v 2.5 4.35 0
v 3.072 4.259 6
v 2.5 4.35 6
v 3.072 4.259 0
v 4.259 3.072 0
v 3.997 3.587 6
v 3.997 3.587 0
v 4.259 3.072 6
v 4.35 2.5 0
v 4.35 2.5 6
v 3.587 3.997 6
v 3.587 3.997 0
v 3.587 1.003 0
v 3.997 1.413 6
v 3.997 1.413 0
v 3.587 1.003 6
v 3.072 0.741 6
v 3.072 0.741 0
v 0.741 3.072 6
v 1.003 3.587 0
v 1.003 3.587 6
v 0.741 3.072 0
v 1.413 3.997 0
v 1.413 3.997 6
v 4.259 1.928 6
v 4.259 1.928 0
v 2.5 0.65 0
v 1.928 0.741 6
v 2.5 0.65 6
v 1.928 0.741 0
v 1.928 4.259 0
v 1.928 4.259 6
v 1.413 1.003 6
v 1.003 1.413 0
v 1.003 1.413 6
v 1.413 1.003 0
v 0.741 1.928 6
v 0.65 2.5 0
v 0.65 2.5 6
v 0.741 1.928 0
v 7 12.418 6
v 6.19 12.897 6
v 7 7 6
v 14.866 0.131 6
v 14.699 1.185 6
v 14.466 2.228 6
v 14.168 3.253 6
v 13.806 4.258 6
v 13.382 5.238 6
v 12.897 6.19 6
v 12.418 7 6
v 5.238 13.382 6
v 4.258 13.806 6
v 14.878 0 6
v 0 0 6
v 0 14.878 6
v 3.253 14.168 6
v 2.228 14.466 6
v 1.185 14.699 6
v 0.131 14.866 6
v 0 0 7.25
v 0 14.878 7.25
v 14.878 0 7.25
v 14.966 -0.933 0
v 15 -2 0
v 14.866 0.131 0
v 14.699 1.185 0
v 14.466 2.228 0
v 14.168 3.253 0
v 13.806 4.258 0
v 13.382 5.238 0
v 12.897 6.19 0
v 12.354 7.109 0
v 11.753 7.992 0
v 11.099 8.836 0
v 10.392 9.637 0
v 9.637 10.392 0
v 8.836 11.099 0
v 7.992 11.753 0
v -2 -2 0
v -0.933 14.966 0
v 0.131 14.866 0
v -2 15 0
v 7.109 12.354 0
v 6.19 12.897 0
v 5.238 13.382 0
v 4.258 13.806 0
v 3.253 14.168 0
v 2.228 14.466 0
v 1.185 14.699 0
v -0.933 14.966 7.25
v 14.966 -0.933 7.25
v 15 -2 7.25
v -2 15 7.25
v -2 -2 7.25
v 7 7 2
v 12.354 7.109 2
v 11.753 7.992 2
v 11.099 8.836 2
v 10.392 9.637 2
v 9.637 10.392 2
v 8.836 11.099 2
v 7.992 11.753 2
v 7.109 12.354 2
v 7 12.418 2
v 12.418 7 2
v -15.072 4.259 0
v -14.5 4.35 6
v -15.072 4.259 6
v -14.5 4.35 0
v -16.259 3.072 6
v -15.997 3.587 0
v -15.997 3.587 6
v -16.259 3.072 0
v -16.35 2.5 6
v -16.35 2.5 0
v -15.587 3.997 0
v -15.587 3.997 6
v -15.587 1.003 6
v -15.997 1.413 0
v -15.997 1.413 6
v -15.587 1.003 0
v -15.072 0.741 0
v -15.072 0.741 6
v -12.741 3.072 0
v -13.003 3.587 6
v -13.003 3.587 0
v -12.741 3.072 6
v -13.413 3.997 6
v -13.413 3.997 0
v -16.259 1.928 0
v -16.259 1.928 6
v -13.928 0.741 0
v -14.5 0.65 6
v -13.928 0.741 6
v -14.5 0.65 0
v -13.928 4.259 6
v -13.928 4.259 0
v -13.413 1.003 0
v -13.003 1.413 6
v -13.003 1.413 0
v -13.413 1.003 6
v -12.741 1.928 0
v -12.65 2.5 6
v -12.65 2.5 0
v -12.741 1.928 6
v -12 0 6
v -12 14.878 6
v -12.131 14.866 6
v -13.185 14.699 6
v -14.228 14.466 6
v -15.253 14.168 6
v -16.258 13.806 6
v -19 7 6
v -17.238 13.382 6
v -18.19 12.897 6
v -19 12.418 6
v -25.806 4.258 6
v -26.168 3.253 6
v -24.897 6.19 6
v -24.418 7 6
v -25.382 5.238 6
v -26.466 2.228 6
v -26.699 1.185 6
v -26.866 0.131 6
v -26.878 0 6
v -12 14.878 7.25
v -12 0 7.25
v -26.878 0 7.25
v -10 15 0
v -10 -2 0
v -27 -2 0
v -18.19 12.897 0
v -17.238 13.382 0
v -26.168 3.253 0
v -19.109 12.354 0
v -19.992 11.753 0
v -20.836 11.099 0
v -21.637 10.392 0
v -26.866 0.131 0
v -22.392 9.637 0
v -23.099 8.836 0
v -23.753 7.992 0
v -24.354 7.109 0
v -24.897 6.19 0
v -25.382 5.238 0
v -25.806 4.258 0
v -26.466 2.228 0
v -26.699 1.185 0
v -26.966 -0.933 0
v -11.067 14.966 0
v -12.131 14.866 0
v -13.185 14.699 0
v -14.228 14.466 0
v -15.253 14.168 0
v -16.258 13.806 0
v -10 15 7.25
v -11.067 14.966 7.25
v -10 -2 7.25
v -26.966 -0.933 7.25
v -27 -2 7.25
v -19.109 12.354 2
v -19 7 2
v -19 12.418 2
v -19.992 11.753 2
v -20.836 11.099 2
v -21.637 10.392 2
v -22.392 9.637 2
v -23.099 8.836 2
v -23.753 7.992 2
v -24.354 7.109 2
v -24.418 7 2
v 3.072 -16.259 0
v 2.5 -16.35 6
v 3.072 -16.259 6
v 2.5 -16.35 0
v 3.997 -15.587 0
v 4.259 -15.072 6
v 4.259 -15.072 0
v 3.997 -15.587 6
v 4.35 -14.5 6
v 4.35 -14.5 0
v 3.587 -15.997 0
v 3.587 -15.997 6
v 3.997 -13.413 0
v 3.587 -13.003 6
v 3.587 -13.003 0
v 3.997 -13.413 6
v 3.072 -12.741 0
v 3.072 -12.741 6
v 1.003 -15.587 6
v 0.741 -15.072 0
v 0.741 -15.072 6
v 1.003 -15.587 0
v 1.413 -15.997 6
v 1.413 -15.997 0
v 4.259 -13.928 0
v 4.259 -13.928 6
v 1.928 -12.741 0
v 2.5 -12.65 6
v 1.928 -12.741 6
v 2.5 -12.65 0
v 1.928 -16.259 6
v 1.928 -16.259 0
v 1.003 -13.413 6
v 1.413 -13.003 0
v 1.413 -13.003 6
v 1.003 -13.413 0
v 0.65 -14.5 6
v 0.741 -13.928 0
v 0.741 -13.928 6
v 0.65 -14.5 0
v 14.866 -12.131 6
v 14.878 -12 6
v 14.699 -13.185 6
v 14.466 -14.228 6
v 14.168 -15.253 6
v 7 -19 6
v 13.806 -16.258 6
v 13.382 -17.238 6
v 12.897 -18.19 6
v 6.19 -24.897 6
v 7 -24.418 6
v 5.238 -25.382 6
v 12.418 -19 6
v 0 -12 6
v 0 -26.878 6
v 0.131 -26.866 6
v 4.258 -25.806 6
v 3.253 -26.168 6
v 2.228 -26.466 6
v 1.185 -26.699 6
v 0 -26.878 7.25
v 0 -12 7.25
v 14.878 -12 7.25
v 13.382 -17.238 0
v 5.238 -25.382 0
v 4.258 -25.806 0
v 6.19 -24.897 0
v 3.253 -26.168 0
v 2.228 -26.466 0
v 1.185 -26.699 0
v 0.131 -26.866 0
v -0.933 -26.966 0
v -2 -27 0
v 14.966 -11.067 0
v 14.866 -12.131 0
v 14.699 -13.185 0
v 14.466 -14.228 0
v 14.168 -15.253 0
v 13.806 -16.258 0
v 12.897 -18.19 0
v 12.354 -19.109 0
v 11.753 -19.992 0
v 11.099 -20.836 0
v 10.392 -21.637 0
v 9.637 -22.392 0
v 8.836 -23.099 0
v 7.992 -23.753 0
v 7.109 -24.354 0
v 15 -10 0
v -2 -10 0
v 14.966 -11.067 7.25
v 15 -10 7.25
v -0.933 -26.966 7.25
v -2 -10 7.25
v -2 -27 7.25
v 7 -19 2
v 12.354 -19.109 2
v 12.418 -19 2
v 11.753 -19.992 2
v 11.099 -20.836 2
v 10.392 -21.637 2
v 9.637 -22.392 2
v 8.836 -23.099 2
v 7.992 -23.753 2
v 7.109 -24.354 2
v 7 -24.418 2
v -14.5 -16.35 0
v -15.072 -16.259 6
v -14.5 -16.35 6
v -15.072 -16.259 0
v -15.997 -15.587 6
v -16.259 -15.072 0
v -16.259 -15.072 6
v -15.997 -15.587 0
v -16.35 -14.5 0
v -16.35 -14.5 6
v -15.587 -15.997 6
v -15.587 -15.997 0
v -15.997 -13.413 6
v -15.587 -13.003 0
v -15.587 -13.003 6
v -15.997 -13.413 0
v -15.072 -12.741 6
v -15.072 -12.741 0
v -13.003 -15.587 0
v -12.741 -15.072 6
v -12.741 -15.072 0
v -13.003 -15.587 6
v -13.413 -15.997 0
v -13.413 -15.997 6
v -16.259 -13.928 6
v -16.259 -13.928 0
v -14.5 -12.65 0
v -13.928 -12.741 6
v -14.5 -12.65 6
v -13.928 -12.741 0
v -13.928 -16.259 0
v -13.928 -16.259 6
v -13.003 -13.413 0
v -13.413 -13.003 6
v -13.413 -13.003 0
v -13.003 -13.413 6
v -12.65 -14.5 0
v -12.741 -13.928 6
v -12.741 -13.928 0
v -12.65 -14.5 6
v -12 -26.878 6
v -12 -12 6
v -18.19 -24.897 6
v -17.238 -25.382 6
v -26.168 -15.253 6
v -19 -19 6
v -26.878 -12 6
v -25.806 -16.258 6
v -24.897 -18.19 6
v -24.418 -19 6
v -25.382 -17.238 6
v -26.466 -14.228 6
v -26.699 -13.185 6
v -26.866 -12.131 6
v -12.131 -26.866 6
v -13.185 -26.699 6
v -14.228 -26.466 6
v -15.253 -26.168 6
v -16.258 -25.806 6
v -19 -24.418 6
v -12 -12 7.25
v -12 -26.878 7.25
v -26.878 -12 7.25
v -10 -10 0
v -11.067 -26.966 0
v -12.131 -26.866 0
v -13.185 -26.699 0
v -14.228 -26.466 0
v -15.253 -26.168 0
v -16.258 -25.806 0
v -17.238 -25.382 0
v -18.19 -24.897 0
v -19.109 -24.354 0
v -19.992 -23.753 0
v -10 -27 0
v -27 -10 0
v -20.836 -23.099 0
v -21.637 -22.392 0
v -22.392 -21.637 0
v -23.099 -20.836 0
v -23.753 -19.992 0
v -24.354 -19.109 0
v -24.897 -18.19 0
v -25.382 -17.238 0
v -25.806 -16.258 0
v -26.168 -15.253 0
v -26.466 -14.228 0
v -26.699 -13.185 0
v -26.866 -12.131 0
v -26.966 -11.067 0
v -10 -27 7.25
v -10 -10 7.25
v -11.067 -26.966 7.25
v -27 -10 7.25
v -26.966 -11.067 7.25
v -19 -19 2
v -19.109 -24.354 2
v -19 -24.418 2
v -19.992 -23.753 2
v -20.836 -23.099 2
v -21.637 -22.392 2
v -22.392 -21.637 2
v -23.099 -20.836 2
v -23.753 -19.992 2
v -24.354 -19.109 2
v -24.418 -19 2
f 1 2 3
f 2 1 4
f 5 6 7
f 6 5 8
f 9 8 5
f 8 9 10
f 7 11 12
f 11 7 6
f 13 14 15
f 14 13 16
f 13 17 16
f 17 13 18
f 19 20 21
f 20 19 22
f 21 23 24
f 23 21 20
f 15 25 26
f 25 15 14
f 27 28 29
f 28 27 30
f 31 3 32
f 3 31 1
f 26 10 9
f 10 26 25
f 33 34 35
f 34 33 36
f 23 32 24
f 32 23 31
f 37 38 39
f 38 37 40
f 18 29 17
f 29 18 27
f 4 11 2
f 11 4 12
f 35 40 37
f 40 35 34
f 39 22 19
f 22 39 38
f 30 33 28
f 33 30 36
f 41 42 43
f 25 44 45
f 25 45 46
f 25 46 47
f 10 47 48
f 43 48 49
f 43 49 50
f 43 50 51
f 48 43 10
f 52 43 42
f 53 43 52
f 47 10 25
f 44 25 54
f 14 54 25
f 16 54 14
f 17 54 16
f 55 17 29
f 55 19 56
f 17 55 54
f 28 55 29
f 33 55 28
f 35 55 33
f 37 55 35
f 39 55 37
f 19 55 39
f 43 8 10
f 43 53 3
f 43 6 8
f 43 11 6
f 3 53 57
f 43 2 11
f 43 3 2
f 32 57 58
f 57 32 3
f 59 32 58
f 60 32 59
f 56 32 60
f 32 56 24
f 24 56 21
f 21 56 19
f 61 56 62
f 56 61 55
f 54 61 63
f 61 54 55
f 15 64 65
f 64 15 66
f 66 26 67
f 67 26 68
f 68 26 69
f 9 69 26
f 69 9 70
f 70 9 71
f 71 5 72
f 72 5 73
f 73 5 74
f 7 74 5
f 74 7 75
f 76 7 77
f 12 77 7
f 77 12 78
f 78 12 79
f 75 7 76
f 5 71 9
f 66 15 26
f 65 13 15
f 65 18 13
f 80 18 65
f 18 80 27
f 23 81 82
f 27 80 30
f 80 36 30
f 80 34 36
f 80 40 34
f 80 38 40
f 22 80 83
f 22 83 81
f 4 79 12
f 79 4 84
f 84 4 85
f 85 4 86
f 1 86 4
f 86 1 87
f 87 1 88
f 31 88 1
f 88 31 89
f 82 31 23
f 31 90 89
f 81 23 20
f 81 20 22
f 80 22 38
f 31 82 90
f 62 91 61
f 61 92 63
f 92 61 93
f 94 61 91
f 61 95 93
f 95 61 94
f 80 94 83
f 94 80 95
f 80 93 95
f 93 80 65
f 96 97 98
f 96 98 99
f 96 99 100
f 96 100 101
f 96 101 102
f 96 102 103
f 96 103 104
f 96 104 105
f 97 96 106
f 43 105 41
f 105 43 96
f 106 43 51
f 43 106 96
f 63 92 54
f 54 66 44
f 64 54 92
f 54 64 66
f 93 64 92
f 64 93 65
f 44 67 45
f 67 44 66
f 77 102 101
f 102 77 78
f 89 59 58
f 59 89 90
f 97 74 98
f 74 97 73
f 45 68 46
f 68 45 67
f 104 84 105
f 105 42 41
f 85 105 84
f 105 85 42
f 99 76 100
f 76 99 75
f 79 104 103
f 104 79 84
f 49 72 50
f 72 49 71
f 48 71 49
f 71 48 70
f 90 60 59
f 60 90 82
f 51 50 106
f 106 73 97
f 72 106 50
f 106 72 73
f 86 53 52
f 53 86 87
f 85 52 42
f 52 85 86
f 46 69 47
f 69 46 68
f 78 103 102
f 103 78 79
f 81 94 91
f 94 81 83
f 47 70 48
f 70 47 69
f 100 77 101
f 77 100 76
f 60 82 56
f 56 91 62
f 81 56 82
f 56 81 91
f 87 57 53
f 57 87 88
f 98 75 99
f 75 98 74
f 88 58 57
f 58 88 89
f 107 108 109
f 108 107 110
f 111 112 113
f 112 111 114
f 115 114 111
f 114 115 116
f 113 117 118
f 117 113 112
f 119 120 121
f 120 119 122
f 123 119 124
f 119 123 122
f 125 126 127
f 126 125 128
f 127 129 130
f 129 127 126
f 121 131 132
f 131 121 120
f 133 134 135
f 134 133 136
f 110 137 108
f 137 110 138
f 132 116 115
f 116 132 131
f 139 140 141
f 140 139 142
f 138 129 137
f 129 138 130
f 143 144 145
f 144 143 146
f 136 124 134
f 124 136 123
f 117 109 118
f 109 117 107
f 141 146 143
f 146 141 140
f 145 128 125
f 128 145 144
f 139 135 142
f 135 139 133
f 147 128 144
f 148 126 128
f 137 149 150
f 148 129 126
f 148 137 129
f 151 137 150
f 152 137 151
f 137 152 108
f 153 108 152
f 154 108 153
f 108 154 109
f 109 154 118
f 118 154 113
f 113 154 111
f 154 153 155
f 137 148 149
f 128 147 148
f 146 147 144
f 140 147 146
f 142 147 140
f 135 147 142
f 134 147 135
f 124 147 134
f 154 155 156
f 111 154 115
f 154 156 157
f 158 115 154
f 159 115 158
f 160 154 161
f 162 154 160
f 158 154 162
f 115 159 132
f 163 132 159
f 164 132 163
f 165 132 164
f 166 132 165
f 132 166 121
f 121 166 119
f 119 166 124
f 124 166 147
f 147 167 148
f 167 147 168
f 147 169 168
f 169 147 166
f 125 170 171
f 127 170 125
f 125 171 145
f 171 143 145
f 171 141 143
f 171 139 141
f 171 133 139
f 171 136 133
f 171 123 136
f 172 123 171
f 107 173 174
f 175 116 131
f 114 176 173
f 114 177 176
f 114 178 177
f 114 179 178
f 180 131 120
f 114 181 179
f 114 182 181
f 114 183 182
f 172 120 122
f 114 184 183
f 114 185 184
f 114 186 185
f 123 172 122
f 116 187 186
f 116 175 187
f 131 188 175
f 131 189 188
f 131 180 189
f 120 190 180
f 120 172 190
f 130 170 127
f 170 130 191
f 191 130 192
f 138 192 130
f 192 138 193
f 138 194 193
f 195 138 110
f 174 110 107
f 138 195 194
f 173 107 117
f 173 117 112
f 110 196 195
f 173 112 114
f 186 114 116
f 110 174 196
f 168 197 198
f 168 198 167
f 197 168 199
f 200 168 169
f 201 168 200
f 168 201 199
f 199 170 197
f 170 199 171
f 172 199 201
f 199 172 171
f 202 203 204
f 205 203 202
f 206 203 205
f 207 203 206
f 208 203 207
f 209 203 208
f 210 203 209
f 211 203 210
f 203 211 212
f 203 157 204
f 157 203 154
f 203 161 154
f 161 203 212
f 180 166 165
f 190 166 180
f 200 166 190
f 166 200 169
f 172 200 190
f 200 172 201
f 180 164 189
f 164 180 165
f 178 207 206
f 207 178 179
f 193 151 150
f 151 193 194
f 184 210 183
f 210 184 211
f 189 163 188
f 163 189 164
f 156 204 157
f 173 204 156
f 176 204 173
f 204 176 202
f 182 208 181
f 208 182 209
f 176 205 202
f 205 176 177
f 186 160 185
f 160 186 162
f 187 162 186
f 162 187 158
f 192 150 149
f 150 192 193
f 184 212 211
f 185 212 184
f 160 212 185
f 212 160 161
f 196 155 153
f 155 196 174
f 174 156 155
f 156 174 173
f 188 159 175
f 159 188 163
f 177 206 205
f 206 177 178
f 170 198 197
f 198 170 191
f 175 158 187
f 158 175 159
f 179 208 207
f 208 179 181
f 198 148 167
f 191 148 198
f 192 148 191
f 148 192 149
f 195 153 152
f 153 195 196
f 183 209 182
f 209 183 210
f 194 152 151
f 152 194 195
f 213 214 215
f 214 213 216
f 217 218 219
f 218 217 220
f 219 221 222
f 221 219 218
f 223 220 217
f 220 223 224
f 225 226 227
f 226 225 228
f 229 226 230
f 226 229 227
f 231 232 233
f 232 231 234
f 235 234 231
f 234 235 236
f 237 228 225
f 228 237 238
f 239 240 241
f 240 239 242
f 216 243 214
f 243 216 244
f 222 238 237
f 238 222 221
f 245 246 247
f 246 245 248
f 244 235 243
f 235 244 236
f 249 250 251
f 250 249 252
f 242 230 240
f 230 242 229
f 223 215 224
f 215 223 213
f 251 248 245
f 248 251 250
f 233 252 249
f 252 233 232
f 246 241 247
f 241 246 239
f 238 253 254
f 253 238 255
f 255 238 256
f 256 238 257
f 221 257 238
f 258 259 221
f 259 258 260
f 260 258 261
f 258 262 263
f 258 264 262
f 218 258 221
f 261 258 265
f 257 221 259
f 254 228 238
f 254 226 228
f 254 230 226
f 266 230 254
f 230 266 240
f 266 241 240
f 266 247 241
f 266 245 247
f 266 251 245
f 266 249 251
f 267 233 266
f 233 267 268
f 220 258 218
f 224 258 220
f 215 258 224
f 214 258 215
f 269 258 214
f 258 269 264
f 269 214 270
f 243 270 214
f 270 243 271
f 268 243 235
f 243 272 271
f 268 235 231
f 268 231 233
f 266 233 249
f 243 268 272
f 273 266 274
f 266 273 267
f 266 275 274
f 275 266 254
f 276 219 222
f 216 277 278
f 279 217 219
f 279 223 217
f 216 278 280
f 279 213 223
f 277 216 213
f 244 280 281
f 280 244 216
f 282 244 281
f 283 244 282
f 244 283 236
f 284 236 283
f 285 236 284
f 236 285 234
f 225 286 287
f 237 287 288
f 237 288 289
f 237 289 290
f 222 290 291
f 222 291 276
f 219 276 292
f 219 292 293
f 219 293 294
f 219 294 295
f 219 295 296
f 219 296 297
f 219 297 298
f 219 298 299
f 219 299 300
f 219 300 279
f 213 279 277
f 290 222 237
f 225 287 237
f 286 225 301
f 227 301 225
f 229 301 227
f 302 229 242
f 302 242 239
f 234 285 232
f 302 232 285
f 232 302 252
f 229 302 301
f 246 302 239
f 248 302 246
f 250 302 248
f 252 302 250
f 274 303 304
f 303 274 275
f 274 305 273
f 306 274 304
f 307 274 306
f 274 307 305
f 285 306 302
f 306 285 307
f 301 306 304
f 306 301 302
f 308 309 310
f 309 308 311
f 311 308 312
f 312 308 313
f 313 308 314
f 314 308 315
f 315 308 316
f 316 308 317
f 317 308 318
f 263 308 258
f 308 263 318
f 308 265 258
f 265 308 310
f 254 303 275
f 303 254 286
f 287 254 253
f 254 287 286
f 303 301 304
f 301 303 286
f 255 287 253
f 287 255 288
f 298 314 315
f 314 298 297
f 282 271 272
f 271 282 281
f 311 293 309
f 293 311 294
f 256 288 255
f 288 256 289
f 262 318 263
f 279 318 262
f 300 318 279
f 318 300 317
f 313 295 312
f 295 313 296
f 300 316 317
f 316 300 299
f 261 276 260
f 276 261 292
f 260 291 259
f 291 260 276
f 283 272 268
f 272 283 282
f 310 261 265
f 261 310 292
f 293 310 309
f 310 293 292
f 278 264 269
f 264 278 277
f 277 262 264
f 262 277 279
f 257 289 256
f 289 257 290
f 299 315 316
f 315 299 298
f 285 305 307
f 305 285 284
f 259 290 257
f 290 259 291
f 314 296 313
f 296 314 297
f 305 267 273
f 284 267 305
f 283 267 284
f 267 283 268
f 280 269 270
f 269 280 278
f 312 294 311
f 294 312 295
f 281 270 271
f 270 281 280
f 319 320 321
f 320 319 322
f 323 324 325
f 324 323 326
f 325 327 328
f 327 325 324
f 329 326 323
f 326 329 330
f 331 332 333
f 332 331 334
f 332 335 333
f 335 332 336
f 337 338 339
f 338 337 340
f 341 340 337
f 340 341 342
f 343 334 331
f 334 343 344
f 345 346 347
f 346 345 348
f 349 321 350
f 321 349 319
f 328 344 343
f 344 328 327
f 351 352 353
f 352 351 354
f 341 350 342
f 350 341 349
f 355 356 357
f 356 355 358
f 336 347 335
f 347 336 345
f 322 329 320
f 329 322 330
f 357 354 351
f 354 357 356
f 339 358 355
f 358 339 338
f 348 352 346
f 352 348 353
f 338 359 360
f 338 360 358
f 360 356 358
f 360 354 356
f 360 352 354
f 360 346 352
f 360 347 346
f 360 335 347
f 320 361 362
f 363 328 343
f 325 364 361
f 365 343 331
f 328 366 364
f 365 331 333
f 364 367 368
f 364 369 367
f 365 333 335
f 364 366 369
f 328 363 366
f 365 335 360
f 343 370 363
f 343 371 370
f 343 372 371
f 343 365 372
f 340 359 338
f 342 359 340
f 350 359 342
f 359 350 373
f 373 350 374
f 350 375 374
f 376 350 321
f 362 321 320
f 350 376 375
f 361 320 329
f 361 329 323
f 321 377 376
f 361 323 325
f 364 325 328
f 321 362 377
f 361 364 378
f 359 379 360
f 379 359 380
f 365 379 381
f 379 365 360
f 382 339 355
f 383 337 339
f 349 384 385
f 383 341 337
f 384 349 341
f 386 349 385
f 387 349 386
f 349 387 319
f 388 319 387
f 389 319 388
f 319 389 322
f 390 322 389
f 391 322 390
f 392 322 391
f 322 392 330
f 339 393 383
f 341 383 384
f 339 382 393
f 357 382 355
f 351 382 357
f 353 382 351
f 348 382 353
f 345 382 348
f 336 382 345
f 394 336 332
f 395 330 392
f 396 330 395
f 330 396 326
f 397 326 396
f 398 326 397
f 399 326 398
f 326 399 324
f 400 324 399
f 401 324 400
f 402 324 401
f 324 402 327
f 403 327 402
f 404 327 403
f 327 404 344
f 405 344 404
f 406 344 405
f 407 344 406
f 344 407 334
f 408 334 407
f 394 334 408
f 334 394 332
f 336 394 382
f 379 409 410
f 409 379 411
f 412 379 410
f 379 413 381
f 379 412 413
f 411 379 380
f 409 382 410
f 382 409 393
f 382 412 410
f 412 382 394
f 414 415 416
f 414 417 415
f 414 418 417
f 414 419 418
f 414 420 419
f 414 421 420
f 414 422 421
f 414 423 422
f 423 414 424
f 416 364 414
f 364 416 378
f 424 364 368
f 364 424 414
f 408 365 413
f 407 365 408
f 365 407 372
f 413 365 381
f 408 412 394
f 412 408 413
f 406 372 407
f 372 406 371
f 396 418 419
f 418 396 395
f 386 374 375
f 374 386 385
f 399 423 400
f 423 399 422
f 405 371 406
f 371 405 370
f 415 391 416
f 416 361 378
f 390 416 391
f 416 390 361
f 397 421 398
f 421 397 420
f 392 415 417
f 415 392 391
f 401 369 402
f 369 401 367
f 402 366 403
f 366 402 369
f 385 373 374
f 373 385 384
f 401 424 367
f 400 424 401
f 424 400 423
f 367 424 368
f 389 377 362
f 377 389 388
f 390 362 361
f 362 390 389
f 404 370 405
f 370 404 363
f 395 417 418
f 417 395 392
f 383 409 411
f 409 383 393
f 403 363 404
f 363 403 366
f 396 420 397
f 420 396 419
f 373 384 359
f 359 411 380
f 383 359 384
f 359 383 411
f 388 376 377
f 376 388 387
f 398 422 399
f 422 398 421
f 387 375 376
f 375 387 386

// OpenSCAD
/* [HeatedBed] */

hotBedThickness = 2.5;
hotBedSizeX = 214; 
hotBedSizeY = 214; 
hotBedMountPointX = 2.5;
hotBedMountPointY = 2.5;
hotBedMountPointDiameter = 3.7;

/* [Glass] */

glassThickness = 4;
glassSizeX = 200;
glassSizeY = 200; 

/* [Mount] */

mountTopThickness = 2;
mountBorderThickness = 2;
mountGlassBorderThickness = 4;
mountSize = 15;


/* [Hidden] */

hotBedBoltLength = 20;

// Calculations
hotBedMountPoints = [[hotBedMountPointX,hotBedMountPointY,0],
							[hotBedMountPointX,hotBedSizeY-hotBedMountPointY,0],
							[hotBedSizeX-hotBedMountPointX,hotBedSizeY-hotBedMountPointY,0],
							[hotBedSizeX-hotBedMountPointX,hotBedMountPointY,0]];

// Hot Bed
module HotBed(){
	difference() {
		color("OrangeRed", 1) 
			cube([hotBedSizeX, hotBedSizeY, hotBedThickness]);
		HotBedBolts();
/*
		for (i = hotBedMountPoints)
		{
			translate(i) 
				cylinder(h=hotBedThickness,r=hotBedMountPointDiameter/2, $fn=10);
		}
*/
	}
}

module HotBedBolts(){
	for (i = hotBedMountPoints)
	{
		translate(i+[0,0,-5]) 
			cylinder(h=hotBedThickness+glassThickness+10,r=hotBedMountPointDiameter/2, $fn=20);
	}
}

module Glass() {
	glassPosition = [(hotBedSizeX-glassSizeX)/2,(hotBedSizeY-glassSizeY)/2,hotBedThickness];
	color("Azure",0.7) 
		translate(glassPosition) cube([glassSizeX, glassSizeY, glassThickness]);
}

module GlassMount() {
	mountTotalHeight=hotBedThickness/2+glassThickness+mountTopThickness;
	mountPosition=[-mountBorderThickness,-mountBorderThickness,hotBedThickness/2];
	intersection() {
	difference(){
		translate(mountPosition) 
			color("Blue")
				cube([mountSize+mountBorderThickness,mountSize+mountBorderThickness,mountTotalHeight]);	
		HotBed();
		HotBedBolts();
		Glass();
		// Substract top piece
	//	translate([mountGlassBorderThickness,mountGlassBorderThickness,mountTopThickness]) Glass();
		// Triangle
	}
		translate(mountPosition)cylinder(h=mountTotalHeight,r=mountSize+mountBorderThickness,$fn=100);
	}
}
 
//HotBed();
//HotBedBolts();
//Glass();
//GlassMount();

module GlassMountPair() {
	translate([0,0,glassThickness + hotBedThickness + mountTopThickness])
	mirror([0,0,90]){
		GlassMount();
		translate([-10-mountBorderThickness, 0, 0]) mirror() GlassMount();
	}
}

GlassMountPair();
translate([0, -10-mountBorderThickness, 0]) mirror([0,1,0]) GlassMountPair();
